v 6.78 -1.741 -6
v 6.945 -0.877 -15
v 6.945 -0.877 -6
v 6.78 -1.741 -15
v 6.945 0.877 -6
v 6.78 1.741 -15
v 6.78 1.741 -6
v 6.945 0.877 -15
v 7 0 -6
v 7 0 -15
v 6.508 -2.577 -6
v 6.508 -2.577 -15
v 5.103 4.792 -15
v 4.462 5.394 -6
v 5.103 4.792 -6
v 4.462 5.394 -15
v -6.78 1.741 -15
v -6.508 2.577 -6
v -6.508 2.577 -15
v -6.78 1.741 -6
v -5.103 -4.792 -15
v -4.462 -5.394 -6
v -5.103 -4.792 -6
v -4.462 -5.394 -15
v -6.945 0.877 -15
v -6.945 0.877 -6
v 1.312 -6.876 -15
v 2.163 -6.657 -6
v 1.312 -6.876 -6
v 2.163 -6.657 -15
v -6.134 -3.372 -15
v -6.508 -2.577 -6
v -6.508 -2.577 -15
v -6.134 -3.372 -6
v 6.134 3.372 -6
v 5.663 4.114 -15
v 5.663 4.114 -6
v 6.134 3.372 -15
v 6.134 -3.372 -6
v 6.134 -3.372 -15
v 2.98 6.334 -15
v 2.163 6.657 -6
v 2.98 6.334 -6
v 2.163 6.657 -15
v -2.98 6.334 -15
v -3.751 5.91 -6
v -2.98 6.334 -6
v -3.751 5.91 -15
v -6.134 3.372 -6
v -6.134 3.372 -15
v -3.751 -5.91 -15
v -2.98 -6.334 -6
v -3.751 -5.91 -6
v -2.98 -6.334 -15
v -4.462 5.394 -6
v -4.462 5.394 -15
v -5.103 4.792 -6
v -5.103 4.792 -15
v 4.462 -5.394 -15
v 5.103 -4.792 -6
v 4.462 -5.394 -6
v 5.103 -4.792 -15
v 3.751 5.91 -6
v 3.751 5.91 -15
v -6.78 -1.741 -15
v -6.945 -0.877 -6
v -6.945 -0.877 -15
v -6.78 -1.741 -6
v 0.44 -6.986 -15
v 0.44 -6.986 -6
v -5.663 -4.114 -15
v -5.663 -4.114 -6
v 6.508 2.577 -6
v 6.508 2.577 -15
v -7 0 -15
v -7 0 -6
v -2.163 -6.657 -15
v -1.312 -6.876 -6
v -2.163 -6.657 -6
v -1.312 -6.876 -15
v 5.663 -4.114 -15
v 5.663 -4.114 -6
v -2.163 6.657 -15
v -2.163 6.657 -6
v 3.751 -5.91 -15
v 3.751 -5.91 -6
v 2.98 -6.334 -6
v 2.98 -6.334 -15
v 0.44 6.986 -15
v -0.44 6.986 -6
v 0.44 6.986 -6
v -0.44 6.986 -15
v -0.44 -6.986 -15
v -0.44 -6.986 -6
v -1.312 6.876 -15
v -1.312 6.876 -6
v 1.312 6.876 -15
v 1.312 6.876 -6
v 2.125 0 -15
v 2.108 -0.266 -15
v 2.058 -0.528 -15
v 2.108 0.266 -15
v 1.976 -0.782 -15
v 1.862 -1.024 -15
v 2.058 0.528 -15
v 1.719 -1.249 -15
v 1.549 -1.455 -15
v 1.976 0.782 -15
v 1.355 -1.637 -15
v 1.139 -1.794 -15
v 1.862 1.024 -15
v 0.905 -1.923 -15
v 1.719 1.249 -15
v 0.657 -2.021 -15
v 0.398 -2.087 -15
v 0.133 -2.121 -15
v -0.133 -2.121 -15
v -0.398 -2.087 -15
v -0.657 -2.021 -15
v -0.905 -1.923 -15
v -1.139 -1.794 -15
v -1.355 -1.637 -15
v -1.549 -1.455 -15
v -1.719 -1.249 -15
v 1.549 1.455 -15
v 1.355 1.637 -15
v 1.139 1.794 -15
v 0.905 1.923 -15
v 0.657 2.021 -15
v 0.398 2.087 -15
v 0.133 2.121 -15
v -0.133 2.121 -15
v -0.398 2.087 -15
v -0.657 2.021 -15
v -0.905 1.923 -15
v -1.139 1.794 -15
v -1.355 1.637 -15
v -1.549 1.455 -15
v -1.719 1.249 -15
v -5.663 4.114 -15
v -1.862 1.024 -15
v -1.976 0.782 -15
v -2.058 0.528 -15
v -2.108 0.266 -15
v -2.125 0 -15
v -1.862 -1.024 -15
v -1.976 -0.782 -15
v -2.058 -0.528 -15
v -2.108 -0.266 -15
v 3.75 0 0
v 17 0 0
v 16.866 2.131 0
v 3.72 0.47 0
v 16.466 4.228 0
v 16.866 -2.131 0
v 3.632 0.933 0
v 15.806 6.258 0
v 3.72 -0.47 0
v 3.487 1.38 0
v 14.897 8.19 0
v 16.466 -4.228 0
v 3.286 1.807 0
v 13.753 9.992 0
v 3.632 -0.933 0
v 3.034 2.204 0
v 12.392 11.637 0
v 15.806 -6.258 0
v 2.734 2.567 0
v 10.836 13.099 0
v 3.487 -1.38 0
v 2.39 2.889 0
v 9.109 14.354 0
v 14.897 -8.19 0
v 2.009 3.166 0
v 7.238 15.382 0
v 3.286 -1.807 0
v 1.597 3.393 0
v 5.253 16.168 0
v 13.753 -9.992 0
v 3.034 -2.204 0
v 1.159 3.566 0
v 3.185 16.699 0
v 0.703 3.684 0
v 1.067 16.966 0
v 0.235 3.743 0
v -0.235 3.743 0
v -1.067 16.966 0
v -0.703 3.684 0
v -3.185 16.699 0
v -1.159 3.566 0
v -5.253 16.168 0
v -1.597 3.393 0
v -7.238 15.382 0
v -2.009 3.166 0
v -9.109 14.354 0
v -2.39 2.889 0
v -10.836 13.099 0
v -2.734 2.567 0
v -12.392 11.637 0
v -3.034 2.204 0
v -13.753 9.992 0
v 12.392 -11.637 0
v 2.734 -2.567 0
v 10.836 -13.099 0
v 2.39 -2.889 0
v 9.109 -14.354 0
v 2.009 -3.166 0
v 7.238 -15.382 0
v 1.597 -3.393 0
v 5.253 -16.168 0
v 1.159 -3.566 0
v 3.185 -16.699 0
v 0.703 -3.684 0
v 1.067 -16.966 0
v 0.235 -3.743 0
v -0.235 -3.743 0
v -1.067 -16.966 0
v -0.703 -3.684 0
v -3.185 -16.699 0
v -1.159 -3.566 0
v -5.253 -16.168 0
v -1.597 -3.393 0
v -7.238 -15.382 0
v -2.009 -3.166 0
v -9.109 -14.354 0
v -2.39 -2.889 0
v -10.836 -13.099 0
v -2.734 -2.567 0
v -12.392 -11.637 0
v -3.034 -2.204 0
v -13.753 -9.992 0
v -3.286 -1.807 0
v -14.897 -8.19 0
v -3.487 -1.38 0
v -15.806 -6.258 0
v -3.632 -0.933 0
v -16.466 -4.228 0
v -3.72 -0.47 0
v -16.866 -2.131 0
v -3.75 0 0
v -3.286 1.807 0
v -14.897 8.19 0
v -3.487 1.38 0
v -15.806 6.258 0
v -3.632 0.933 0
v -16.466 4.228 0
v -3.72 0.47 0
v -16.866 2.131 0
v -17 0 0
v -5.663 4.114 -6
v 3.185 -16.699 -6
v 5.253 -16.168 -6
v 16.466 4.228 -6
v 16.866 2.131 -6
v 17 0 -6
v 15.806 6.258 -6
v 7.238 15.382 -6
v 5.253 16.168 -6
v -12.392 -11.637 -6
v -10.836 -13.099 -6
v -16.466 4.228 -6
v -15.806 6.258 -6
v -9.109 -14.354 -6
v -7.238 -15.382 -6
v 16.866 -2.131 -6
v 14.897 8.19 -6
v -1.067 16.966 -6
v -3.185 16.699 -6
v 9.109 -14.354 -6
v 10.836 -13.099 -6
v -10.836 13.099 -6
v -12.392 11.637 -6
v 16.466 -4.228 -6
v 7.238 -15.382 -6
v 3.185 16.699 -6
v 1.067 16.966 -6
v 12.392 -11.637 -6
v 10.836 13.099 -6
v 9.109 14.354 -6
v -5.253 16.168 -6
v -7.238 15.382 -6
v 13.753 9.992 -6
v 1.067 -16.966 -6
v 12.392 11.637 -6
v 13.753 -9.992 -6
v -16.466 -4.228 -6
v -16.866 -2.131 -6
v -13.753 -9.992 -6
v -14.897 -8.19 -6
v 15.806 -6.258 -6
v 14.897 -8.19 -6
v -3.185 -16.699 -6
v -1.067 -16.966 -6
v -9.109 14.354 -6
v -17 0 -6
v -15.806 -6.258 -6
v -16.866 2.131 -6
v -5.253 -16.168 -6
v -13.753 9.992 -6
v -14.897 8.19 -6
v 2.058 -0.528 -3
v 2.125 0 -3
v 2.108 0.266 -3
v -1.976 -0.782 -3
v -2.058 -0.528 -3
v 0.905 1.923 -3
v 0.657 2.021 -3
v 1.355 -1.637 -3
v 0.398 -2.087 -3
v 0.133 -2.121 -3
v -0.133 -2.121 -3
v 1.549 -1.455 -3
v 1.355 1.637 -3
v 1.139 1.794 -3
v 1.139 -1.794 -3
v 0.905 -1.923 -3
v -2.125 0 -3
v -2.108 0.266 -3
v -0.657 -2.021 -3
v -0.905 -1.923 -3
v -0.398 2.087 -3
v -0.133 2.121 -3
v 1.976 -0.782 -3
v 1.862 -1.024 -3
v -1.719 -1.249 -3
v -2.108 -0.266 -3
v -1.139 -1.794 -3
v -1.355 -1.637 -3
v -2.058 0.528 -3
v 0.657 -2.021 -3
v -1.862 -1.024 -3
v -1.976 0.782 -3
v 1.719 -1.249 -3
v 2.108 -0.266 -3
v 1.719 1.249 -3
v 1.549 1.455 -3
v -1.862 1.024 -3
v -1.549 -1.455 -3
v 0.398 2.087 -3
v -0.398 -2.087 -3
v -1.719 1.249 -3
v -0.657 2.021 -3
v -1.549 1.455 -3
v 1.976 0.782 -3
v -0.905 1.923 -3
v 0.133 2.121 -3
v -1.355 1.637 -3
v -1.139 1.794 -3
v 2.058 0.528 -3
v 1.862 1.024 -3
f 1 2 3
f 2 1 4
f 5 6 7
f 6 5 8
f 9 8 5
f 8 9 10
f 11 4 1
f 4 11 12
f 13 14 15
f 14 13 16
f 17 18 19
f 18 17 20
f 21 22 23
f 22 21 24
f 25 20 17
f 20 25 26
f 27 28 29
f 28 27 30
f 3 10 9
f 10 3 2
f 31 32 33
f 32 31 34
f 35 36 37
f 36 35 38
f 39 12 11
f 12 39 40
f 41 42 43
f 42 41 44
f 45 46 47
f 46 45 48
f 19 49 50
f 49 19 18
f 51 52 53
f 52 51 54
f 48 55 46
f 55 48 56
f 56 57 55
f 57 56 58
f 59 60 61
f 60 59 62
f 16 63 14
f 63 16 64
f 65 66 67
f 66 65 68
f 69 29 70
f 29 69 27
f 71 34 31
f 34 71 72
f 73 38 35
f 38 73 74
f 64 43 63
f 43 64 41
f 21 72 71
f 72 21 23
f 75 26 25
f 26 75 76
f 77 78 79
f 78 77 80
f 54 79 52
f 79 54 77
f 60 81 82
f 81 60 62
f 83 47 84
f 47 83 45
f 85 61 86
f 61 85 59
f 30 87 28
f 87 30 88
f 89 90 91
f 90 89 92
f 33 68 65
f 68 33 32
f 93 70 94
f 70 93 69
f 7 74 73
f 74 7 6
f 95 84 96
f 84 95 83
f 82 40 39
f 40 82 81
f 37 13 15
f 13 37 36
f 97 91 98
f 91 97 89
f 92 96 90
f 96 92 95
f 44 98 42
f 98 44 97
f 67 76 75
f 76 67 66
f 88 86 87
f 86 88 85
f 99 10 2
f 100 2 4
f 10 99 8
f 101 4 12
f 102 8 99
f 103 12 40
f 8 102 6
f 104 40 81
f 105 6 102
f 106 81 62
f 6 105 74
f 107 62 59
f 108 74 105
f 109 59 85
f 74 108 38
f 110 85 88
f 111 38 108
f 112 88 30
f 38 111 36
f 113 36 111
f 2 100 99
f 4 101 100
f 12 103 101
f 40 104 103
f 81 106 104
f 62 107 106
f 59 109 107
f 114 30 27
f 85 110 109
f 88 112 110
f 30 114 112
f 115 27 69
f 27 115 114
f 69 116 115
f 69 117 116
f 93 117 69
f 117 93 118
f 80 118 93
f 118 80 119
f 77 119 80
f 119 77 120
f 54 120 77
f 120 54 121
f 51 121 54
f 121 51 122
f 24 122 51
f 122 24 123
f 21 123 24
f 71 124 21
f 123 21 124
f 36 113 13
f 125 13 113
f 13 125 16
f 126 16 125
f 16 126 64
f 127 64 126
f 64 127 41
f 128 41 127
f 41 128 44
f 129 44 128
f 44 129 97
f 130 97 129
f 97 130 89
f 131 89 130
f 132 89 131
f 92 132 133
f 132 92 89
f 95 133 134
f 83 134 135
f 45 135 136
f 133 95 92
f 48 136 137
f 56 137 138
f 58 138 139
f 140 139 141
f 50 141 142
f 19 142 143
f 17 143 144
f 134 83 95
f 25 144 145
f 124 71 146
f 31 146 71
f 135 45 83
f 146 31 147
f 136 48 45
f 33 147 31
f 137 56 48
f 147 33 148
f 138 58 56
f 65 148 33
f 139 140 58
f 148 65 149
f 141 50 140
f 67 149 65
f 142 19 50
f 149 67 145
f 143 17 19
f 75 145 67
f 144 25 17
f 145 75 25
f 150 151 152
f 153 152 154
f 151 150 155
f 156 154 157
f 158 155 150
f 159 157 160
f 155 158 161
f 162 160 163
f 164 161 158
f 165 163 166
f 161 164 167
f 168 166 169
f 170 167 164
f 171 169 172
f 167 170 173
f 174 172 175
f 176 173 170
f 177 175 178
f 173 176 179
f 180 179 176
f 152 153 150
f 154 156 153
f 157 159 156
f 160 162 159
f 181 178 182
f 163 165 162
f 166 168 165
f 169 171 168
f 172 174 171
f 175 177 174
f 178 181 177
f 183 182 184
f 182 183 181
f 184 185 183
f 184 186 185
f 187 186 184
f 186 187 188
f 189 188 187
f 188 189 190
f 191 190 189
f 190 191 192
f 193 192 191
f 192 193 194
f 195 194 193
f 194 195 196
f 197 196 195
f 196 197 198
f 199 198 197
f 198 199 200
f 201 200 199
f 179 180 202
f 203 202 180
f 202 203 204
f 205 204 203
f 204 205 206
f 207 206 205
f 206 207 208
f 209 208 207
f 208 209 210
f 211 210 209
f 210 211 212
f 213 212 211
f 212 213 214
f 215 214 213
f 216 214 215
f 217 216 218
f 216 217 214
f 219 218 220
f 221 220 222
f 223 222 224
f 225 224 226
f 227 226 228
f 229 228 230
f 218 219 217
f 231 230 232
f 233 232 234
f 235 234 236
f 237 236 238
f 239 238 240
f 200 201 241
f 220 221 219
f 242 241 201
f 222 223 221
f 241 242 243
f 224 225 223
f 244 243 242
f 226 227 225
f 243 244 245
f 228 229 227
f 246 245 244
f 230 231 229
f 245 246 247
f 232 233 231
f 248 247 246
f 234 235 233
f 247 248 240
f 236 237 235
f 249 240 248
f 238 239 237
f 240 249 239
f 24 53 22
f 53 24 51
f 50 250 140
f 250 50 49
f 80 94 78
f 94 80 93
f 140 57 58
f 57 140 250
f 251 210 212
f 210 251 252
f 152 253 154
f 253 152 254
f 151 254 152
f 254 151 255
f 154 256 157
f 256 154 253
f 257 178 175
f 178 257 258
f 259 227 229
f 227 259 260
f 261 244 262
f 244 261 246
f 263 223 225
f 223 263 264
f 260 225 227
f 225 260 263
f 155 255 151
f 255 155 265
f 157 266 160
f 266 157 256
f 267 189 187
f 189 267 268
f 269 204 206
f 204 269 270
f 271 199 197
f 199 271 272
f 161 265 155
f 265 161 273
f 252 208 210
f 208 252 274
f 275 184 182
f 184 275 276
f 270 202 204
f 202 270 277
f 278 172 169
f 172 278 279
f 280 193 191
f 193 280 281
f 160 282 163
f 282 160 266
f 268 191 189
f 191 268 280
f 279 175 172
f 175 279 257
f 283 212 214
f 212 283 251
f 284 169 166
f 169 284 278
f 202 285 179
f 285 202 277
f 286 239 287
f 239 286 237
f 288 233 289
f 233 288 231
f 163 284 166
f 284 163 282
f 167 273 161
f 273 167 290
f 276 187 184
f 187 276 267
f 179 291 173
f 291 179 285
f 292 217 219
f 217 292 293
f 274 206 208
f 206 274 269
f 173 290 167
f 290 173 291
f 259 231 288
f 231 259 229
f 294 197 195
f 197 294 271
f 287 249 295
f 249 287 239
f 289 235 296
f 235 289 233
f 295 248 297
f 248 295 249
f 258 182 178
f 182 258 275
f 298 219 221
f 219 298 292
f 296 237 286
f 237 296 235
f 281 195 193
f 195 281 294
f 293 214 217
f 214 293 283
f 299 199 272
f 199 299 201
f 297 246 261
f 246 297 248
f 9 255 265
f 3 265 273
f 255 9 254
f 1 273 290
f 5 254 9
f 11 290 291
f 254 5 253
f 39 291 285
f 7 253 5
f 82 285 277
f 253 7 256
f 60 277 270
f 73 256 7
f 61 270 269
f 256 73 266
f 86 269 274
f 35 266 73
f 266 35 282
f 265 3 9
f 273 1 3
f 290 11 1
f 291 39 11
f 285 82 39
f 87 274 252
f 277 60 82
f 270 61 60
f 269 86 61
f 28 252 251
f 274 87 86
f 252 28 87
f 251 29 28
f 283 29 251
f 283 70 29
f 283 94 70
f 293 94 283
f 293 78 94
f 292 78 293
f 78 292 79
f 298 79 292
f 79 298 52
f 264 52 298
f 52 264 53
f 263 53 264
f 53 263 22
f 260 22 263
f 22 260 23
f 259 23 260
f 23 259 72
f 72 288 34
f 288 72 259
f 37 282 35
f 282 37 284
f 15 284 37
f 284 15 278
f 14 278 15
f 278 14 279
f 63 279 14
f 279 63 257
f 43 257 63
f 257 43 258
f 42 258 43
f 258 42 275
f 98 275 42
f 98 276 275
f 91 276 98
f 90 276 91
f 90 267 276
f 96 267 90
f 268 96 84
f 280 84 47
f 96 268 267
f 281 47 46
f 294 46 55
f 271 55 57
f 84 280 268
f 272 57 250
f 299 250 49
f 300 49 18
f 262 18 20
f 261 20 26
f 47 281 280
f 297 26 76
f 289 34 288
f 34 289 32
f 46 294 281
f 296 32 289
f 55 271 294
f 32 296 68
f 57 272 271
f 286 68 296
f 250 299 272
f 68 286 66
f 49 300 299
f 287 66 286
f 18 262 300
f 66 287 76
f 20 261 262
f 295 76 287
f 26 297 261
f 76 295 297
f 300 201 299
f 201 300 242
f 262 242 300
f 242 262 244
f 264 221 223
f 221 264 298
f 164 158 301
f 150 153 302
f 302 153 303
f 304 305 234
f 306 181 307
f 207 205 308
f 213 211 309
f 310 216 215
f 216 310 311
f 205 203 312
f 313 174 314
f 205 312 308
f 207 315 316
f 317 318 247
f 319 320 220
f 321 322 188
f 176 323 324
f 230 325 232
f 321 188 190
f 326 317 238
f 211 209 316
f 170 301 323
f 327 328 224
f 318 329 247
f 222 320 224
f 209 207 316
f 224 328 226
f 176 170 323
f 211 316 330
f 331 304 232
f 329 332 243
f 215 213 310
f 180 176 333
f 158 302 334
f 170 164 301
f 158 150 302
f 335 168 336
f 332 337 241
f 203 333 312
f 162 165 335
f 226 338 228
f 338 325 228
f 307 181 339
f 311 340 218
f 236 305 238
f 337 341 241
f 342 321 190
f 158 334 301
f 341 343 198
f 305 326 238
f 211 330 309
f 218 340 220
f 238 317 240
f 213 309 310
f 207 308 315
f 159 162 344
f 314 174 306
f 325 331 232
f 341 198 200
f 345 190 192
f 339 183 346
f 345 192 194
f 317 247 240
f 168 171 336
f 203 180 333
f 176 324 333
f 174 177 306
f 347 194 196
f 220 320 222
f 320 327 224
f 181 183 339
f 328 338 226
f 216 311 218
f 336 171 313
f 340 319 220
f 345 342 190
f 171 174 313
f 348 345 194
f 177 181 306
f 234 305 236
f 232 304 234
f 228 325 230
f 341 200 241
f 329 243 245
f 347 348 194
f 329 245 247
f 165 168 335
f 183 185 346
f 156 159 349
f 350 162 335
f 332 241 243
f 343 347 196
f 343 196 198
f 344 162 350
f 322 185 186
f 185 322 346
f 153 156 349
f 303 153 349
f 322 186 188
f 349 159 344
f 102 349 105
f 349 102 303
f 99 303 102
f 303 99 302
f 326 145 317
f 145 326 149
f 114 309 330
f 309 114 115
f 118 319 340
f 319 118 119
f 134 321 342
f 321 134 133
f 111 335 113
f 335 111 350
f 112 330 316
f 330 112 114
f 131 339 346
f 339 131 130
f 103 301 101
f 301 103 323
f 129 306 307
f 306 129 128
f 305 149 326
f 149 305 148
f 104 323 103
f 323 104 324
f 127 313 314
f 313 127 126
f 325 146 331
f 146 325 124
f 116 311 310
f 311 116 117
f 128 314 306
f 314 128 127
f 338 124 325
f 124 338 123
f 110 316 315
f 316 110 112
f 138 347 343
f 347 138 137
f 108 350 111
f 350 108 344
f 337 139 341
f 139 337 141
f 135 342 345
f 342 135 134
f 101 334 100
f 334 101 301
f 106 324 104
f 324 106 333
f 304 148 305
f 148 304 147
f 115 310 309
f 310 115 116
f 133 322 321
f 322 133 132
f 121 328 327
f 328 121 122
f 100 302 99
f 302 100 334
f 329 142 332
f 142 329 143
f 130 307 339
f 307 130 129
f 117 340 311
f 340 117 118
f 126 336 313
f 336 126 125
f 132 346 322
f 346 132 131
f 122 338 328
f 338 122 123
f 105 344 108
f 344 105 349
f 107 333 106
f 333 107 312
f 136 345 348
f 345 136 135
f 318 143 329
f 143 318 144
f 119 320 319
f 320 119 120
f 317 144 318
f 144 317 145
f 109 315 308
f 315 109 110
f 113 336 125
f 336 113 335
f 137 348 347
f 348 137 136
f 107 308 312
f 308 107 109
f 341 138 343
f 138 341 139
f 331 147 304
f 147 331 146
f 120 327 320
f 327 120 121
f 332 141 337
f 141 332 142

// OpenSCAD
$fn = 50;


difference() {
	union() {
		translate(v = [0, 0, -15.0000000000]) {
			cylinder(h = 15, r = 7.0000000000);
		}
		translate(v = [0, 0, -6.0000000000]) {
			cylinder(h = 6, r = 17.0000000000);
		}
	}
	union() {
		translate(v = [0, 0, 0]) {
			rotate(a = [0, 0, 0]) {
				difference() {
					union() {
						#translate(v = [0, 0, -15.0000000000]) {
							cylinder(h = 15, r = 2.0000000000);
						}
						#translate(v = [0, 0, -3]) {
							cylinder(h = 3, r = 7.0000000000, r1 = 2.1250000000, r2 = 3.7500000000);
						}
						#translate(v = [0, 0, -15.0000000000]) {
							cylinder(h = 15, r = 2.1250000000);
						}
						#translate(v = [0, 0, -15.0000000000]) {
							cylinder(h = 15, r = 2.0000000000);
						}
					}
					union();
				}
			}
		}
	}
}
